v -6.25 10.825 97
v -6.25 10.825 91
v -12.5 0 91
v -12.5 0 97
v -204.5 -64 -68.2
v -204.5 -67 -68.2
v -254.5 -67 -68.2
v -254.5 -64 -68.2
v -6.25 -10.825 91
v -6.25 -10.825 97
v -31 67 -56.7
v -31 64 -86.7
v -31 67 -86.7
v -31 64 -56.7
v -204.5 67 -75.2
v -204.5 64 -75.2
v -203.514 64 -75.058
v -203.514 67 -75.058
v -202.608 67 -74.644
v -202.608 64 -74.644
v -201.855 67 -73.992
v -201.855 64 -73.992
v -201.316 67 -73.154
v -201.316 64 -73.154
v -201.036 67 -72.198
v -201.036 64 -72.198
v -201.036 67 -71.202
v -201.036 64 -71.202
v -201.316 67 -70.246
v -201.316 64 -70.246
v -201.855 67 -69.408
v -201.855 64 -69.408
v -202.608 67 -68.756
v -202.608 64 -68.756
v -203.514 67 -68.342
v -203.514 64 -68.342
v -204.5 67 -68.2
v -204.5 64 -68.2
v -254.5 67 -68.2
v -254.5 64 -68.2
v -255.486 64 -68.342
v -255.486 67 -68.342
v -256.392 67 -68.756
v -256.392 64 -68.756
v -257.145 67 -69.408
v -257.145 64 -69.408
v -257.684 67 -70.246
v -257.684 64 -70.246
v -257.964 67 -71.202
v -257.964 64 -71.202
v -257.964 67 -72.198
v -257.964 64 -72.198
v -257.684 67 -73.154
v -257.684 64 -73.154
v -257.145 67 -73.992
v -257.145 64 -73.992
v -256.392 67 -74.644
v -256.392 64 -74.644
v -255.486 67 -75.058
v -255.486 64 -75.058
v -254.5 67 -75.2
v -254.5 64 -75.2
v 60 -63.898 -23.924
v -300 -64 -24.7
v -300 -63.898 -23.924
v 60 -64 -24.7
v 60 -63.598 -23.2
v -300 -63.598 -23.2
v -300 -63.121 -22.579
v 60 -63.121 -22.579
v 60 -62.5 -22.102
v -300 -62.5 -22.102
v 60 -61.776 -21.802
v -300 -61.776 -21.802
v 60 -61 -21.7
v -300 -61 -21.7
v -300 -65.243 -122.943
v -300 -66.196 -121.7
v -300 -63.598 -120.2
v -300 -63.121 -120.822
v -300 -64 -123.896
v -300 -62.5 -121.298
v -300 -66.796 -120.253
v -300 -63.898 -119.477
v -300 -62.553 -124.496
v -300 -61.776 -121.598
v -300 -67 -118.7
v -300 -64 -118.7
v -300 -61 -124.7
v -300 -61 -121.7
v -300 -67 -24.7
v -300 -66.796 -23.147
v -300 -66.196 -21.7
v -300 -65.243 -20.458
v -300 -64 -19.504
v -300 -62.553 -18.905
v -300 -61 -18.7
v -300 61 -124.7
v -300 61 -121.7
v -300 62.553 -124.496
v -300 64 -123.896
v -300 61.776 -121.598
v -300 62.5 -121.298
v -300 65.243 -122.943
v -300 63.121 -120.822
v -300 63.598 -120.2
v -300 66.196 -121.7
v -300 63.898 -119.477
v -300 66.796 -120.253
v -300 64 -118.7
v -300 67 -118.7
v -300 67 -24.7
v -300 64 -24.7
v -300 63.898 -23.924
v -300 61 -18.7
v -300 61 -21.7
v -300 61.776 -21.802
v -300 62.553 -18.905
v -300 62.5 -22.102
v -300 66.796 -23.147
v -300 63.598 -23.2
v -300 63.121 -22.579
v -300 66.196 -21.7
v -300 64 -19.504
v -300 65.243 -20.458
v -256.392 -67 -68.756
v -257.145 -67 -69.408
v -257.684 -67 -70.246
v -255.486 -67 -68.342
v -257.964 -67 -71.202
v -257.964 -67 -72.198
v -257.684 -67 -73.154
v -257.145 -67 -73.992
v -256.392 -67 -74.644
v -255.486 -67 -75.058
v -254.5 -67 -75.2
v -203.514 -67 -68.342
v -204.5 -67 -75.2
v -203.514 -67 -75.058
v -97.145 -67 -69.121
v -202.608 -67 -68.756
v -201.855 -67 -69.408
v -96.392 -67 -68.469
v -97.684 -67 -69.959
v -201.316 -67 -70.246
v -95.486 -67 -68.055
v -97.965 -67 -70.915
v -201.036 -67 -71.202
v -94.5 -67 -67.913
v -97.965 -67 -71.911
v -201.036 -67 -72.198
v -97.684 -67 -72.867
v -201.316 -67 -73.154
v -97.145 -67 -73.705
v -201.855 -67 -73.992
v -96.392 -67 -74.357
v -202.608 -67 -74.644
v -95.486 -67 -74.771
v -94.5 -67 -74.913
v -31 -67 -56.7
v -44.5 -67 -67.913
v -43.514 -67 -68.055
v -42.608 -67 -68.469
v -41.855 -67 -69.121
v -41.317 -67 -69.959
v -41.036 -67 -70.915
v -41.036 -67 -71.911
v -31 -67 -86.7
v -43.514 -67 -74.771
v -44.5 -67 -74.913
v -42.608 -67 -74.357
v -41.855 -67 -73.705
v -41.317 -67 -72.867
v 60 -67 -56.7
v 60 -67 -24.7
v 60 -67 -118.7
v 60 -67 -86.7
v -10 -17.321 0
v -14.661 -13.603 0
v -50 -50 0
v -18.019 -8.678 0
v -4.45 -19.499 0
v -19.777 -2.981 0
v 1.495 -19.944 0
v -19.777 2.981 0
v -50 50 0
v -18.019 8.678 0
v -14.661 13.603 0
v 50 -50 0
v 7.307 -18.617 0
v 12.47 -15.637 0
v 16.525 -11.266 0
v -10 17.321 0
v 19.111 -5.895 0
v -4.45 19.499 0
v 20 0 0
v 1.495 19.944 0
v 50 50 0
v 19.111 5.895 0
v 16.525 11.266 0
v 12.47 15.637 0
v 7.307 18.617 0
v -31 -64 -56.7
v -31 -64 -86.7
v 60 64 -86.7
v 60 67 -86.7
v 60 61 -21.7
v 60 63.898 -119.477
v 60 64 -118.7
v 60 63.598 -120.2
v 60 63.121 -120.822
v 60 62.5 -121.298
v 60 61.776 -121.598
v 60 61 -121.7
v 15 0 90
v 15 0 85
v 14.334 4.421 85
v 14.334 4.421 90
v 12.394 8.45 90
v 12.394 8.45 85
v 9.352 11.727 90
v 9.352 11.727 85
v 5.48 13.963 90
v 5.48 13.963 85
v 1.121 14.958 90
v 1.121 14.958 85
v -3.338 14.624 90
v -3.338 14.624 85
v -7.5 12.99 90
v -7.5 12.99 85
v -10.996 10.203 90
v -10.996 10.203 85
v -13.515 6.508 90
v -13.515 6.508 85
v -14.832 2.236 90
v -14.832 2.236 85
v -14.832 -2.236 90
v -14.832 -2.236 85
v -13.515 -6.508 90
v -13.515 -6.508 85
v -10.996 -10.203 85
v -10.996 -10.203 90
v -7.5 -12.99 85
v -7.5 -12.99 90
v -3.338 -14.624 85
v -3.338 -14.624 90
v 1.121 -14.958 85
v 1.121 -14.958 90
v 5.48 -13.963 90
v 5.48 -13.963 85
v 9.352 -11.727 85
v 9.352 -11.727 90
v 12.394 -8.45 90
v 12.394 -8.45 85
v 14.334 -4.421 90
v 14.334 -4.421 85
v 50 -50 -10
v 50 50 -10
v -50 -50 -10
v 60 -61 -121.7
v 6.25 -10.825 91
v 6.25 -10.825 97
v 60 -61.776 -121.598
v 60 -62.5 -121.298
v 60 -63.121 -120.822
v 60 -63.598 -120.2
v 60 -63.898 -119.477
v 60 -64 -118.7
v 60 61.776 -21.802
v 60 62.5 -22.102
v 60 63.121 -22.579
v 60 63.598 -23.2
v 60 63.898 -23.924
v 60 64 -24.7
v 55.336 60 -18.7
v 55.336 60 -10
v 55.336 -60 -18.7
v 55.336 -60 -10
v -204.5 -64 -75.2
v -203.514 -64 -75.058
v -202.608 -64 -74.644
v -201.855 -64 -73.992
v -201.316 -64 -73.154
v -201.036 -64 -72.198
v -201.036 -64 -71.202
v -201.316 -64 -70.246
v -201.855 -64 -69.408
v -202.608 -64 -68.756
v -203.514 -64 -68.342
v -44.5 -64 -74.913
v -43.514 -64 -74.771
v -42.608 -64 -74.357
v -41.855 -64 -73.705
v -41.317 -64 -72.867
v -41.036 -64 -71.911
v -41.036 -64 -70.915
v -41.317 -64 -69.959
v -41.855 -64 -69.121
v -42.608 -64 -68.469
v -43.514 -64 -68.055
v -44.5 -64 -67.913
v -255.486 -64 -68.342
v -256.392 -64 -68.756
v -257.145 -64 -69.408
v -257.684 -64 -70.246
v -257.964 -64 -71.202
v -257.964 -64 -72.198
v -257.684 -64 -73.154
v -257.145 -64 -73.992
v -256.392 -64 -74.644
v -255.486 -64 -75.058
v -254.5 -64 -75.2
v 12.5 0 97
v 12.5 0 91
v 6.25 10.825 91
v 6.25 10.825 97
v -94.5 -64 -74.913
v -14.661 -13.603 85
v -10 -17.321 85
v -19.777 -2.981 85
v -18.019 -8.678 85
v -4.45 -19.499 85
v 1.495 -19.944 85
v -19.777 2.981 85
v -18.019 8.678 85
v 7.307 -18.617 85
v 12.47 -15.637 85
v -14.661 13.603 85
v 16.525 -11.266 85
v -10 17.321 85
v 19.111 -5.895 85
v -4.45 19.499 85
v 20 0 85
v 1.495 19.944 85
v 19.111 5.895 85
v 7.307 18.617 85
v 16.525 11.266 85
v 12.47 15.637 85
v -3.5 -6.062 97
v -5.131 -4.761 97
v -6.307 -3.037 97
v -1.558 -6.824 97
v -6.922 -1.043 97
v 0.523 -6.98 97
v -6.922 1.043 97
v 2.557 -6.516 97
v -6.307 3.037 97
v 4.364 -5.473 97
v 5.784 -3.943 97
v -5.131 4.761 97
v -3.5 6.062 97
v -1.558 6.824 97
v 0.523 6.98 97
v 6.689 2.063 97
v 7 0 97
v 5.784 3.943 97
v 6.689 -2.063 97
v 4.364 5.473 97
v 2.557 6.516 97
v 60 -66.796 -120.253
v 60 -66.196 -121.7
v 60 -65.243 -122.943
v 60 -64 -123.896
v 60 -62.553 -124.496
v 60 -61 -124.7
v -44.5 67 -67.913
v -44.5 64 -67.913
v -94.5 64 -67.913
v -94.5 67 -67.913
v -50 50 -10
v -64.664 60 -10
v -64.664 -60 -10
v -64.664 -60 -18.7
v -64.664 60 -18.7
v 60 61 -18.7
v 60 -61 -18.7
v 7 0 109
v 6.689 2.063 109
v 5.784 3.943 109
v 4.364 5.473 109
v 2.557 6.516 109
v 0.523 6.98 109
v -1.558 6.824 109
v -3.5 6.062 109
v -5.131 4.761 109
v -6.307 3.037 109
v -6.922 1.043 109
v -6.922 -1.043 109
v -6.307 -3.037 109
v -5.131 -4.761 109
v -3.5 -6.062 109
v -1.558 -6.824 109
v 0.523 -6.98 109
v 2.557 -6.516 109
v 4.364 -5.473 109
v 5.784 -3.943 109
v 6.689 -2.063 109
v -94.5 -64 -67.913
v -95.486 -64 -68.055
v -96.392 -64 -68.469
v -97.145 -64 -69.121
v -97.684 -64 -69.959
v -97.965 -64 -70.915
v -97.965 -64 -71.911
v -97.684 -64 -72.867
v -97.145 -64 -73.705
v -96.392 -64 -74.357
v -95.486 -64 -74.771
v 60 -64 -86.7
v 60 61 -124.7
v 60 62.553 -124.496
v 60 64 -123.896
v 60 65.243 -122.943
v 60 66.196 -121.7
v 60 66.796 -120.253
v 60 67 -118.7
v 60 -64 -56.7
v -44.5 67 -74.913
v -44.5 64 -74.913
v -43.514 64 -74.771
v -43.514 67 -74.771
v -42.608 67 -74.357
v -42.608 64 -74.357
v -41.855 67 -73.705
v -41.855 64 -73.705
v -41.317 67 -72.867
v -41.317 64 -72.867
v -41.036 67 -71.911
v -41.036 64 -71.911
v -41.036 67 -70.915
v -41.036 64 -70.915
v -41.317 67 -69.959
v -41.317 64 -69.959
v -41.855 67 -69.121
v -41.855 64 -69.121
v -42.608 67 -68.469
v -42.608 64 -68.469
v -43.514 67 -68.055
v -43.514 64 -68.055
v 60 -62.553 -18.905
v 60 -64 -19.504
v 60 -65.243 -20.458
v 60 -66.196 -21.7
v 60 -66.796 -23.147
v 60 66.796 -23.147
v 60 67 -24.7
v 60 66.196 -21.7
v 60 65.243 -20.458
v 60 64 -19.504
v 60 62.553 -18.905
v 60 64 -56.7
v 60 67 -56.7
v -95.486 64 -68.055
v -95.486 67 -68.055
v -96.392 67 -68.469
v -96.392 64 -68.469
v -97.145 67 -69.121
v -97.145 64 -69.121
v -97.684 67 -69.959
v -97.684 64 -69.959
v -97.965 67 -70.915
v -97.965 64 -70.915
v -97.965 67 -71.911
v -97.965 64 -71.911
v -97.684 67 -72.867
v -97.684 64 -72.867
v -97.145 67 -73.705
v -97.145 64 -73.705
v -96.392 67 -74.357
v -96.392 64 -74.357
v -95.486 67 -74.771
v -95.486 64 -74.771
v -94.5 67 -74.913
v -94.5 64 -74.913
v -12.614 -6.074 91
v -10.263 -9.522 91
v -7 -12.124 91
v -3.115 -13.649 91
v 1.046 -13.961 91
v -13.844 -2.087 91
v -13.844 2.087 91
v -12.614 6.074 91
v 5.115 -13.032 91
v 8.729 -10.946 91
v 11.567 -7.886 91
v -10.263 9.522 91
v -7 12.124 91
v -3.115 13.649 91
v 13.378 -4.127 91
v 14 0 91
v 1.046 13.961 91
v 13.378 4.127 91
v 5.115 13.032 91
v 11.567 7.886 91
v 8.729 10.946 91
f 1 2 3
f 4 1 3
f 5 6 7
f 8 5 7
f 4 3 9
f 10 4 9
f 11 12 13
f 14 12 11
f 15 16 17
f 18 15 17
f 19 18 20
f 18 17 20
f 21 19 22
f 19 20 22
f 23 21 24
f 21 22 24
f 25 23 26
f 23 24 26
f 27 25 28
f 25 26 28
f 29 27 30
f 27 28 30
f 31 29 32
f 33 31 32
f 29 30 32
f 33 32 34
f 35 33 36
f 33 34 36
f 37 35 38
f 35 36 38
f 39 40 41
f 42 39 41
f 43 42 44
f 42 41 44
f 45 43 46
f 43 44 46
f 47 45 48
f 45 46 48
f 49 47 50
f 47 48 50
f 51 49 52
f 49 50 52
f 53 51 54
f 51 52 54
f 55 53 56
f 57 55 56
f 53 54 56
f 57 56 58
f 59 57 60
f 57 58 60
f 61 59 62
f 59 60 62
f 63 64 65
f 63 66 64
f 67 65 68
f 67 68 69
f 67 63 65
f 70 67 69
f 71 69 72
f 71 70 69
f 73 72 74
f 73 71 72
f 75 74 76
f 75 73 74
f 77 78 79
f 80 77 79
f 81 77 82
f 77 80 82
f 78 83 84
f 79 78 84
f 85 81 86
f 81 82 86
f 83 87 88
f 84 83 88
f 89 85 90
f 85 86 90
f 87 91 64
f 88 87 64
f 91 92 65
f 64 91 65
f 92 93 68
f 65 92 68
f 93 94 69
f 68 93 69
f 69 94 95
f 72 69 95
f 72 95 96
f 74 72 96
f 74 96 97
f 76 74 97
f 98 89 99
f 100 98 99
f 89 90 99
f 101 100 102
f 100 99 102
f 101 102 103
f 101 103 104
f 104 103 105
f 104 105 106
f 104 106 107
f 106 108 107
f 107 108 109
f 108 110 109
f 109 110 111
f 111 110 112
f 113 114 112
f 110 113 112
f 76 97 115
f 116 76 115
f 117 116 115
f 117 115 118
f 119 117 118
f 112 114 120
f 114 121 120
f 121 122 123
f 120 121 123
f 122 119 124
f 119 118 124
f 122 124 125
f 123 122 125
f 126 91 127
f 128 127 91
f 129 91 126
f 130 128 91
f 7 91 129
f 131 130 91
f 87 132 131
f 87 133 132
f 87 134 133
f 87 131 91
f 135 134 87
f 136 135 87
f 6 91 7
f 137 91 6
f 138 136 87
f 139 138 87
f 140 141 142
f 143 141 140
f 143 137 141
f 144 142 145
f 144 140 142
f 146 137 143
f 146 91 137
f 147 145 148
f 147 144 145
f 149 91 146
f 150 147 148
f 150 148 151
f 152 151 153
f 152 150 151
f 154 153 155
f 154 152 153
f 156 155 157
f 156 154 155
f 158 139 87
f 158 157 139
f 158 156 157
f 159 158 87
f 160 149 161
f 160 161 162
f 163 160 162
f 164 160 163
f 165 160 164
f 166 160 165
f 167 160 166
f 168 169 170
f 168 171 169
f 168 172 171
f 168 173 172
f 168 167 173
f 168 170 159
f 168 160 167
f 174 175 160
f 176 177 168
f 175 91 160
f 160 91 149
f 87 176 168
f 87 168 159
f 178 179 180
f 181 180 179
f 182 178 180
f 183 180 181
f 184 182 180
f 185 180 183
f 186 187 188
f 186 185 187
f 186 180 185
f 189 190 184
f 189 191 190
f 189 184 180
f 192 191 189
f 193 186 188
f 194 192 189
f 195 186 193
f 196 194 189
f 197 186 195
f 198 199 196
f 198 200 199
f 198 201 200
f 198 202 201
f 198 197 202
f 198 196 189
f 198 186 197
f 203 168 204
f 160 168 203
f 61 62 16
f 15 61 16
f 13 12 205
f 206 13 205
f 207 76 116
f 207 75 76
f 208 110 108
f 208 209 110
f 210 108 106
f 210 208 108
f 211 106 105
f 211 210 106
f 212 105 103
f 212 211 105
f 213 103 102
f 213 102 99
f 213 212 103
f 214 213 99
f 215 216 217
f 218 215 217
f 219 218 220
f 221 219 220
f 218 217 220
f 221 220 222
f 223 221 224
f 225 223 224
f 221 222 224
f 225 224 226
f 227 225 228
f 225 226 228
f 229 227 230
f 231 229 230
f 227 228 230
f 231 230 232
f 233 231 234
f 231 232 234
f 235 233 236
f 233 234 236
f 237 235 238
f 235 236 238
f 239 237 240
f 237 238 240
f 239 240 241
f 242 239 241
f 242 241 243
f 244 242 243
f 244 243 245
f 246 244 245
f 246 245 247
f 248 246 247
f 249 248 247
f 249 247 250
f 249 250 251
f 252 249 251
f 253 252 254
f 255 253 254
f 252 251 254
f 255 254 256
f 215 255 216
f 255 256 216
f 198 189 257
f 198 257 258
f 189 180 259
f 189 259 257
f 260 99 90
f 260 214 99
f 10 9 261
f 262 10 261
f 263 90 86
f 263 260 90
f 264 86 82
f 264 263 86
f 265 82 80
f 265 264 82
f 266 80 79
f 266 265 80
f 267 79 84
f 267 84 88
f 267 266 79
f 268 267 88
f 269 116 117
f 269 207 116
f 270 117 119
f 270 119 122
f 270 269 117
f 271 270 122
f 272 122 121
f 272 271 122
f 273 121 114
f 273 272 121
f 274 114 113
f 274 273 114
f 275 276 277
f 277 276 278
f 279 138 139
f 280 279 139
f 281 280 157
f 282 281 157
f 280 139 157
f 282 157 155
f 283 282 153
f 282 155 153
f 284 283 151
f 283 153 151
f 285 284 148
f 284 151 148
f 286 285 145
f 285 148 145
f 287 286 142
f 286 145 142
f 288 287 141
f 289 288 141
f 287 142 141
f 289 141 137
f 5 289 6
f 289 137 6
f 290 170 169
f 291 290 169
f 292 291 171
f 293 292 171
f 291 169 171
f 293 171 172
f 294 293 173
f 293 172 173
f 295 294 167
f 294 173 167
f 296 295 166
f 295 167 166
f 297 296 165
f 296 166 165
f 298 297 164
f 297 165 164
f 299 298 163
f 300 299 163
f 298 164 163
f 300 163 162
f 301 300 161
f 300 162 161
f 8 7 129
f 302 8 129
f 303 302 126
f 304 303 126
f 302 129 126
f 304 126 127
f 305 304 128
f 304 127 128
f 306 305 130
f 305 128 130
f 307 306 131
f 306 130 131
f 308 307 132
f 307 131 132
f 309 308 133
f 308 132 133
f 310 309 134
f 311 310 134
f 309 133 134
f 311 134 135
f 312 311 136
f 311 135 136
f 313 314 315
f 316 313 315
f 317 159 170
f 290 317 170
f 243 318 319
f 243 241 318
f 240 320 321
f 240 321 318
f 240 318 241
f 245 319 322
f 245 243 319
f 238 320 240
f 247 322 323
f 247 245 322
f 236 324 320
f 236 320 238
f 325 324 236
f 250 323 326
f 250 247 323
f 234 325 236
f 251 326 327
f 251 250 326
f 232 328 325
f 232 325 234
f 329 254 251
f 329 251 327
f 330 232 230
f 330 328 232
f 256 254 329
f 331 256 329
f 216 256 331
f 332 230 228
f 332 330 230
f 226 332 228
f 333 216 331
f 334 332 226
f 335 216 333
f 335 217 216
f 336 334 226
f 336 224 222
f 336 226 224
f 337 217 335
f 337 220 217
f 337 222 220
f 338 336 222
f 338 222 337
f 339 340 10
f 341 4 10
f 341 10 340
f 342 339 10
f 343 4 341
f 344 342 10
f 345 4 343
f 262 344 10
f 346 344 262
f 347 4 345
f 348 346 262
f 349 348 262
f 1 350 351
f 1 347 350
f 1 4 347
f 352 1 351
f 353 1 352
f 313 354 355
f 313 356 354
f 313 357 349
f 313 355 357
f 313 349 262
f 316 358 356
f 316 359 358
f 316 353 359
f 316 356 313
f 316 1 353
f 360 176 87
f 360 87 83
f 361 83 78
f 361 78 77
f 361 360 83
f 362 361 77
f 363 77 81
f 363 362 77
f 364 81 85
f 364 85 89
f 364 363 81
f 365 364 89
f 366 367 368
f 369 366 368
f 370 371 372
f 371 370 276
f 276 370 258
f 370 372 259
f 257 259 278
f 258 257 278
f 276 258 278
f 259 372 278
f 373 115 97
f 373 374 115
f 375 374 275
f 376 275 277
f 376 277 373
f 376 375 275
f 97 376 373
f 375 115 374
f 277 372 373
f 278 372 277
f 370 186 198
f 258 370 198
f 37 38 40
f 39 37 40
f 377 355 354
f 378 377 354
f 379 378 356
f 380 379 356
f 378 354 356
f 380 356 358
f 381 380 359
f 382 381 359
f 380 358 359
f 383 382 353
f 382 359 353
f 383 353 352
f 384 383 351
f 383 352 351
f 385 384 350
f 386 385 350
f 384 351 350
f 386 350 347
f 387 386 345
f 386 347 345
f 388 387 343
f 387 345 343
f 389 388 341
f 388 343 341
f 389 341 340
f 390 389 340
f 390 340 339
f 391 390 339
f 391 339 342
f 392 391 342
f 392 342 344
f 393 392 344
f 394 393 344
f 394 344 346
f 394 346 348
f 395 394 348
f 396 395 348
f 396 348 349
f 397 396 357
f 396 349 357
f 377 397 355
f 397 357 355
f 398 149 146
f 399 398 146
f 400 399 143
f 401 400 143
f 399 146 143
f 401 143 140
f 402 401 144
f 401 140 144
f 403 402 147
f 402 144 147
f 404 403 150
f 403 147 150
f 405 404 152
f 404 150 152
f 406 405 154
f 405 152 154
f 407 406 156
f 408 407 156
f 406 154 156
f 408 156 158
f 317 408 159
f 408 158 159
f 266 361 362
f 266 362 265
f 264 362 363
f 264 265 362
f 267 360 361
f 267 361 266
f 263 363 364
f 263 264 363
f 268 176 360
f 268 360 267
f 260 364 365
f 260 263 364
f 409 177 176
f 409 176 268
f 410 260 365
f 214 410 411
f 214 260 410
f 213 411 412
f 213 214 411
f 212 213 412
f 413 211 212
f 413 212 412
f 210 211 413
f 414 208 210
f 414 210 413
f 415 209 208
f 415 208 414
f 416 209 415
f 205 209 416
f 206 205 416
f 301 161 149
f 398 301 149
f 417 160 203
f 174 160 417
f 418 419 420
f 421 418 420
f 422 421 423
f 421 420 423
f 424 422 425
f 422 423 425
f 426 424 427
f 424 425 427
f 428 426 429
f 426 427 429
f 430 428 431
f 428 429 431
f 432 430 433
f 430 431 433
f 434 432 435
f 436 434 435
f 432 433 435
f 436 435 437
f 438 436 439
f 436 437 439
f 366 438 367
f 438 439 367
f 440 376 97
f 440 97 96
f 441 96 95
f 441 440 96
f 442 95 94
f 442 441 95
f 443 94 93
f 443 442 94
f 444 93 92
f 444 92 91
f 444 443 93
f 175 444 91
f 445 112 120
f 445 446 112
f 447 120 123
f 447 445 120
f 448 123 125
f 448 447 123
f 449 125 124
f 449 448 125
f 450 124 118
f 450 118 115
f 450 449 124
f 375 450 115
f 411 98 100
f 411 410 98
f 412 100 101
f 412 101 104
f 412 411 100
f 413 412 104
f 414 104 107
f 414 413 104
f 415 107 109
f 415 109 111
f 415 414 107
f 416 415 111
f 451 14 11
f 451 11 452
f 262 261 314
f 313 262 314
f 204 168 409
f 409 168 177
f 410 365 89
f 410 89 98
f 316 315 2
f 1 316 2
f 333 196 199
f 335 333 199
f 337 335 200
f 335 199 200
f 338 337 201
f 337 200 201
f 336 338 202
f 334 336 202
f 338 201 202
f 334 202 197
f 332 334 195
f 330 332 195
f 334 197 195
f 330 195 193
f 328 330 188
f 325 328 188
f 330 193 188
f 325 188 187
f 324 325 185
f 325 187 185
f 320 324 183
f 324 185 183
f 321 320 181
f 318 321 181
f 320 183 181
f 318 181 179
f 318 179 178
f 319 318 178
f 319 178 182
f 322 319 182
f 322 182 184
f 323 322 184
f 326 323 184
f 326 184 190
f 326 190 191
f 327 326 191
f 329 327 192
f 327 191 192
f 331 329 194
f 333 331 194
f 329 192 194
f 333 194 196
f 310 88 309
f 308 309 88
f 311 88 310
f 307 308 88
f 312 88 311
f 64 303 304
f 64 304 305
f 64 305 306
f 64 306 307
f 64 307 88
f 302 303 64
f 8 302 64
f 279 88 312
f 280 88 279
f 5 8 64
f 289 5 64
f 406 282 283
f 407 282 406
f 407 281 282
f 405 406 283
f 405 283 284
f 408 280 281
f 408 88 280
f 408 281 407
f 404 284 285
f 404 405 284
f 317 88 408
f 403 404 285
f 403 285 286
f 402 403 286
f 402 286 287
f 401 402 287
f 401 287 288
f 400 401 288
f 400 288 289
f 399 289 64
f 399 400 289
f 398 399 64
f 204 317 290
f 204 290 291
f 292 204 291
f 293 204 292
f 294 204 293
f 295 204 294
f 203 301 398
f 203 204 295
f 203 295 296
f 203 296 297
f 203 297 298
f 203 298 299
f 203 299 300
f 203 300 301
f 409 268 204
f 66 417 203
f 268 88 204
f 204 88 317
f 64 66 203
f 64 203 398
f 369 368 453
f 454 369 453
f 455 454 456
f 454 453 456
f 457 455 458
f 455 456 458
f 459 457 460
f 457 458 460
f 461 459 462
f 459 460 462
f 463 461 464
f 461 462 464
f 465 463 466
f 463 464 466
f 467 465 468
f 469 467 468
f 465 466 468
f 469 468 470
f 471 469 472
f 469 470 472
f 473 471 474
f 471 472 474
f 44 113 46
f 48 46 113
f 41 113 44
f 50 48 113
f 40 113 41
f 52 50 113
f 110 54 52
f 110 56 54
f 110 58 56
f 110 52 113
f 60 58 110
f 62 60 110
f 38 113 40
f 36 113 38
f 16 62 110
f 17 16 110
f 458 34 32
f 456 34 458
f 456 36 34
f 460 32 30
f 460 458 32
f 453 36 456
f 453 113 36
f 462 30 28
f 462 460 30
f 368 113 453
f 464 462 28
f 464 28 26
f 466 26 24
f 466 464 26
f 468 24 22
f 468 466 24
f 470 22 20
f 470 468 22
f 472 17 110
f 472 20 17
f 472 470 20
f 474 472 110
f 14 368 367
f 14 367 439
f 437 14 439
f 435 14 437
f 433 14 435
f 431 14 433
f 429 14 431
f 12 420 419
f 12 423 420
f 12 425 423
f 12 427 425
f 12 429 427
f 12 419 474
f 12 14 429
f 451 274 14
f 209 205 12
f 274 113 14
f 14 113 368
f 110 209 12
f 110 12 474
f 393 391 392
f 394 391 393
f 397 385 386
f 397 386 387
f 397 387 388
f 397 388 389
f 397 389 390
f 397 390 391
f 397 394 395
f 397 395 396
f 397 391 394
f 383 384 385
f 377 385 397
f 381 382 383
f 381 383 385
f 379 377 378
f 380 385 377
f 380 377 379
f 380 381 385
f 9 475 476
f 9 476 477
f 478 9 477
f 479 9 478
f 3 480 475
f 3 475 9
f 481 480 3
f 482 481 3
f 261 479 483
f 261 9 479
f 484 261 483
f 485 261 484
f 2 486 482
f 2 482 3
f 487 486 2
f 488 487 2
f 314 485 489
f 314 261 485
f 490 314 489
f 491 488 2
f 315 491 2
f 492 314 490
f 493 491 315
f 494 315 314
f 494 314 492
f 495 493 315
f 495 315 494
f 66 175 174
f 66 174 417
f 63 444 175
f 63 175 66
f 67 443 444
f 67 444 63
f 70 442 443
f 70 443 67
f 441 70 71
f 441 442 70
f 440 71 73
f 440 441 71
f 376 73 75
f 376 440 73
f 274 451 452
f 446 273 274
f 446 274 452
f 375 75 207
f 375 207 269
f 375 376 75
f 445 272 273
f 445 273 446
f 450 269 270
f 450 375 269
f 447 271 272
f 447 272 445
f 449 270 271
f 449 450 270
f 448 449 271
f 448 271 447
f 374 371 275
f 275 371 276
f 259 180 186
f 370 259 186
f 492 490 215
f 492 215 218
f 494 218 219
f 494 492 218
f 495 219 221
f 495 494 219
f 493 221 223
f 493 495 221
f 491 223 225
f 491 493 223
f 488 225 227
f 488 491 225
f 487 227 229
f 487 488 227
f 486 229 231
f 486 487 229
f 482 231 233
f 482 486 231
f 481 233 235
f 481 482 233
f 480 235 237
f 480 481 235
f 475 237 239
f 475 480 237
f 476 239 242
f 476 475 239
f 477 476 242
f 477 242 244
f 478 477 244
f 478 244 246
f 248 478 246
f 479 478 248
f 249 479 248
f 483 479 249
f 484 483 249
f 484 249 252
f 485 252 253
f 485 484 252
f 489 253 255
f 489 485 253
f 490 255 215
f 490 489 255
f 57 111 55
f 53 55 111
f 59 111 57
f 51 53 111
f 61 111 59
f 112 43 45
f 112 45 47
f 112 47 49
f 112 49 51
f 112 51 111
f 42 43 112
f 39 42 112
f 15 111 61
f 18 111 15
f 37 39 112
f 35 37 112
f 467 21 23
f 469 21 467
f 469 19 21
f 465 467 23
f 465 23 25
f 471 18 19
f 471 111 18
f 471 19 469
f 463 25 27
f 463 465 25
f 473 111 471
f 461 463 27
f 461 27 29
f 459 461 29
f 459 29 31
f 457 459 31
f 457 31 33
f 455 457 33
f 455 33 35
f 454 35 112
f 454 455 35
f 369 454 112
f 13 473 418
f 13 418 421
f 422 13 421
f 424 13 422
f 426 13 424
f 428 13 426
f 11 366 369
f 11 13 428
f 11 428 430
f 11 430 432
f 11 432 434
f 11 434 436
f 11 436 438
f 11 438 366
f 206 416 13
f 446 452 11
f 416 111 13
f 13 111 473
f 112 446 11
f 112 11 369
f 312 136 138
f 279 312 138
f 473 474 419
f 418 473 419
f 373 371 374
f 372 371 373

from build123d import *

# Parameters (mm, degrees)
F0_R           = 20
F1_DEPTH       = 85
F2_W           = 100
F2_H           = 100
F3_DEPTH       = 10
F4_W           = 120
F4_H           = 120
F5_DEPTH       = 10
F6_R           = 15
F7_DEPTH       = 6
F8_SIZE        = 1
F10_DEPTH      = 6
F11_R          = 7
F12_DEPTH      = 12
F14_DEPTH      = 60
F14_DEPTH_BACK = 300
F16_DEPTH      = 134.001
F17_W          = 182
F17_H          = 30
F18_DEPTH      = 134.001


with BuildPart() as f1:
    # F0 (on Top) → F1 (new body)
    with BuildSketch(Plane.XY):
        Circle(F0_R)
    extrude(amount=F1_DEPTH)

    # F2 (on Top) → F3 (join)
    with BuildSketch(Plane.XY):
        Rectangle(F2_W, F2_H)
    extrude(amount=-F3_DEPTH)

    # F4 (on face) → F5 (join)
    with BuildSketch(Plane(origin=(0, 0, -10), x_dir=(1, 0, 0), z_dir=(0, 0, -1))):
        with Locations((-4.663671, 0)):
            Rectangle(F4_W, F4_H)
    extrude(amount=F5_DEPTH)

    # F6 (on face) → F7 (join)
    with BuildSketch(Plane.XY.offset(85)):
        Circle(F6_R)
    extrude(amount=F7_DEPTH)

    # F8
    f8_edges = [f1.edges().sort_by_distance(p)[0] for p in [
        (-15, 0, 91),
    ]]
    chamfer(f8_edges, length=F8_SIZE)

    # F9 (on face) → F10 (join)
    with BuildSketch(Plane.XY.offset(91)):
        Polygon((-6.25, 10.825318), (-12.5, 0), (-6.25, -10.825318), (6.25, -10.825318), (12.5, 0), (6.25, 10.825318), align=None)
    extrude(amount=F10_DEPTH)

    # F11 (on face) → F12 (join)
    with BuildSketch(Plane.XY.offset(97)):
        Circle(F11_R)
    extrude(amount=F12_DEPTH)

    # F13 (on Right) → F14 (join, two sides)
    with BuildSketch(Plane.YZ) as f14_sk:
        with BuildLine():
            Line((61, -18.70025), (-61, -18.70025))
            ThreePointArc((-61, -18.70025), (-65.242641, -20.457609), (-67, -24.70025))
            Line((-67, -24.70025), (-67, -118.70025))
            ThreePointArc((-67, -118.70025), (-65.242641, -122.94289), (-61, -124.70025))
            Line((-61, -124.70025), (61, -124.70025))
            ThreePointArc((61, -124.70025), (65.242641, -122.94289), (67, -118.70025))
            Line((67, -118.70025), (67, -24.70025))
            ThreePointArc((67, -24.70025), (65.242641, -20.457609), (61, -18.70025))
        make_face()
        with BuildLine():
            Line((-64, -118.70025), (-64, -24.70025))
            ThreePointArc((-64, -24.70025), (-63.12132, -22.578929), (-61, -21.70025))
            Line((-61, -21.70025), (61, -21.70025))
            ThreePointArc((61, -21.70025), (63.12132, -22.578929), (64, -24.70025))
            Line((64, -24.70025), (64, -118.70025))
            ThreePointArc((64, -118.70025), (63.12132, -120.82157), (61, -121.70025))
            Line((61, -121.70025), (-61, -121.70025))
            ThreePointArc((-61, -121.70025), (-63.12132, -120.82157), (-64, -118.70025))
        make_face(mode=Mode.SUBTRACT)
    extrude(amount=F14_DEPTH)
    extrude(f14_sk.sketch, amount=-F14_DEPTH_BACK)

    # F15 (on face) → F16 (cut, through all)
    with BuildSketch(Plane.XZ.offset(67)):
        with BuildLine():
            ThreePointArc((-254.5, -68.2), (-258, -71.7), (-254.5, -75.2))
            Line((-254.5, -75.2), (-204.5, -75.2))
            ThreePointArc((-204.5, -75.2), (-201, -71.7), (-204.5, -68.2))
            Line((-204.5, -68.2), (-254.5, -68.2))
        make_face()
        with BuildLine():
            Line((-44.500257, -67.913005), (-94.500257, -67.913005))
            ThreePointArc((-94.500257, -67.913005), (-98.000257, -71.413005), (-94.500257, -74.913005))
            Line((-94.500257, -74.913005), (-44.500257, -74.913005))
            ThreePointArc((-44.500257, -74.913005), (-41.000257, -71.413005), (-44.500257, -67.913005))
        make_face()
    extrude(amount=-F16_DEPTH, mode=Mode.SUBTRACT)

    # F17 (on face) → F18 (cut, through all)
    with BuildSketch(Plane.XZ.offset(67)):
        with Locations((60, -71.70025)):
            Rectangle(F17_W, F17_H)
    extrude(amount=-F18_DEPTH, mode=Mode.SUBTRACT)


solid = f1.part
